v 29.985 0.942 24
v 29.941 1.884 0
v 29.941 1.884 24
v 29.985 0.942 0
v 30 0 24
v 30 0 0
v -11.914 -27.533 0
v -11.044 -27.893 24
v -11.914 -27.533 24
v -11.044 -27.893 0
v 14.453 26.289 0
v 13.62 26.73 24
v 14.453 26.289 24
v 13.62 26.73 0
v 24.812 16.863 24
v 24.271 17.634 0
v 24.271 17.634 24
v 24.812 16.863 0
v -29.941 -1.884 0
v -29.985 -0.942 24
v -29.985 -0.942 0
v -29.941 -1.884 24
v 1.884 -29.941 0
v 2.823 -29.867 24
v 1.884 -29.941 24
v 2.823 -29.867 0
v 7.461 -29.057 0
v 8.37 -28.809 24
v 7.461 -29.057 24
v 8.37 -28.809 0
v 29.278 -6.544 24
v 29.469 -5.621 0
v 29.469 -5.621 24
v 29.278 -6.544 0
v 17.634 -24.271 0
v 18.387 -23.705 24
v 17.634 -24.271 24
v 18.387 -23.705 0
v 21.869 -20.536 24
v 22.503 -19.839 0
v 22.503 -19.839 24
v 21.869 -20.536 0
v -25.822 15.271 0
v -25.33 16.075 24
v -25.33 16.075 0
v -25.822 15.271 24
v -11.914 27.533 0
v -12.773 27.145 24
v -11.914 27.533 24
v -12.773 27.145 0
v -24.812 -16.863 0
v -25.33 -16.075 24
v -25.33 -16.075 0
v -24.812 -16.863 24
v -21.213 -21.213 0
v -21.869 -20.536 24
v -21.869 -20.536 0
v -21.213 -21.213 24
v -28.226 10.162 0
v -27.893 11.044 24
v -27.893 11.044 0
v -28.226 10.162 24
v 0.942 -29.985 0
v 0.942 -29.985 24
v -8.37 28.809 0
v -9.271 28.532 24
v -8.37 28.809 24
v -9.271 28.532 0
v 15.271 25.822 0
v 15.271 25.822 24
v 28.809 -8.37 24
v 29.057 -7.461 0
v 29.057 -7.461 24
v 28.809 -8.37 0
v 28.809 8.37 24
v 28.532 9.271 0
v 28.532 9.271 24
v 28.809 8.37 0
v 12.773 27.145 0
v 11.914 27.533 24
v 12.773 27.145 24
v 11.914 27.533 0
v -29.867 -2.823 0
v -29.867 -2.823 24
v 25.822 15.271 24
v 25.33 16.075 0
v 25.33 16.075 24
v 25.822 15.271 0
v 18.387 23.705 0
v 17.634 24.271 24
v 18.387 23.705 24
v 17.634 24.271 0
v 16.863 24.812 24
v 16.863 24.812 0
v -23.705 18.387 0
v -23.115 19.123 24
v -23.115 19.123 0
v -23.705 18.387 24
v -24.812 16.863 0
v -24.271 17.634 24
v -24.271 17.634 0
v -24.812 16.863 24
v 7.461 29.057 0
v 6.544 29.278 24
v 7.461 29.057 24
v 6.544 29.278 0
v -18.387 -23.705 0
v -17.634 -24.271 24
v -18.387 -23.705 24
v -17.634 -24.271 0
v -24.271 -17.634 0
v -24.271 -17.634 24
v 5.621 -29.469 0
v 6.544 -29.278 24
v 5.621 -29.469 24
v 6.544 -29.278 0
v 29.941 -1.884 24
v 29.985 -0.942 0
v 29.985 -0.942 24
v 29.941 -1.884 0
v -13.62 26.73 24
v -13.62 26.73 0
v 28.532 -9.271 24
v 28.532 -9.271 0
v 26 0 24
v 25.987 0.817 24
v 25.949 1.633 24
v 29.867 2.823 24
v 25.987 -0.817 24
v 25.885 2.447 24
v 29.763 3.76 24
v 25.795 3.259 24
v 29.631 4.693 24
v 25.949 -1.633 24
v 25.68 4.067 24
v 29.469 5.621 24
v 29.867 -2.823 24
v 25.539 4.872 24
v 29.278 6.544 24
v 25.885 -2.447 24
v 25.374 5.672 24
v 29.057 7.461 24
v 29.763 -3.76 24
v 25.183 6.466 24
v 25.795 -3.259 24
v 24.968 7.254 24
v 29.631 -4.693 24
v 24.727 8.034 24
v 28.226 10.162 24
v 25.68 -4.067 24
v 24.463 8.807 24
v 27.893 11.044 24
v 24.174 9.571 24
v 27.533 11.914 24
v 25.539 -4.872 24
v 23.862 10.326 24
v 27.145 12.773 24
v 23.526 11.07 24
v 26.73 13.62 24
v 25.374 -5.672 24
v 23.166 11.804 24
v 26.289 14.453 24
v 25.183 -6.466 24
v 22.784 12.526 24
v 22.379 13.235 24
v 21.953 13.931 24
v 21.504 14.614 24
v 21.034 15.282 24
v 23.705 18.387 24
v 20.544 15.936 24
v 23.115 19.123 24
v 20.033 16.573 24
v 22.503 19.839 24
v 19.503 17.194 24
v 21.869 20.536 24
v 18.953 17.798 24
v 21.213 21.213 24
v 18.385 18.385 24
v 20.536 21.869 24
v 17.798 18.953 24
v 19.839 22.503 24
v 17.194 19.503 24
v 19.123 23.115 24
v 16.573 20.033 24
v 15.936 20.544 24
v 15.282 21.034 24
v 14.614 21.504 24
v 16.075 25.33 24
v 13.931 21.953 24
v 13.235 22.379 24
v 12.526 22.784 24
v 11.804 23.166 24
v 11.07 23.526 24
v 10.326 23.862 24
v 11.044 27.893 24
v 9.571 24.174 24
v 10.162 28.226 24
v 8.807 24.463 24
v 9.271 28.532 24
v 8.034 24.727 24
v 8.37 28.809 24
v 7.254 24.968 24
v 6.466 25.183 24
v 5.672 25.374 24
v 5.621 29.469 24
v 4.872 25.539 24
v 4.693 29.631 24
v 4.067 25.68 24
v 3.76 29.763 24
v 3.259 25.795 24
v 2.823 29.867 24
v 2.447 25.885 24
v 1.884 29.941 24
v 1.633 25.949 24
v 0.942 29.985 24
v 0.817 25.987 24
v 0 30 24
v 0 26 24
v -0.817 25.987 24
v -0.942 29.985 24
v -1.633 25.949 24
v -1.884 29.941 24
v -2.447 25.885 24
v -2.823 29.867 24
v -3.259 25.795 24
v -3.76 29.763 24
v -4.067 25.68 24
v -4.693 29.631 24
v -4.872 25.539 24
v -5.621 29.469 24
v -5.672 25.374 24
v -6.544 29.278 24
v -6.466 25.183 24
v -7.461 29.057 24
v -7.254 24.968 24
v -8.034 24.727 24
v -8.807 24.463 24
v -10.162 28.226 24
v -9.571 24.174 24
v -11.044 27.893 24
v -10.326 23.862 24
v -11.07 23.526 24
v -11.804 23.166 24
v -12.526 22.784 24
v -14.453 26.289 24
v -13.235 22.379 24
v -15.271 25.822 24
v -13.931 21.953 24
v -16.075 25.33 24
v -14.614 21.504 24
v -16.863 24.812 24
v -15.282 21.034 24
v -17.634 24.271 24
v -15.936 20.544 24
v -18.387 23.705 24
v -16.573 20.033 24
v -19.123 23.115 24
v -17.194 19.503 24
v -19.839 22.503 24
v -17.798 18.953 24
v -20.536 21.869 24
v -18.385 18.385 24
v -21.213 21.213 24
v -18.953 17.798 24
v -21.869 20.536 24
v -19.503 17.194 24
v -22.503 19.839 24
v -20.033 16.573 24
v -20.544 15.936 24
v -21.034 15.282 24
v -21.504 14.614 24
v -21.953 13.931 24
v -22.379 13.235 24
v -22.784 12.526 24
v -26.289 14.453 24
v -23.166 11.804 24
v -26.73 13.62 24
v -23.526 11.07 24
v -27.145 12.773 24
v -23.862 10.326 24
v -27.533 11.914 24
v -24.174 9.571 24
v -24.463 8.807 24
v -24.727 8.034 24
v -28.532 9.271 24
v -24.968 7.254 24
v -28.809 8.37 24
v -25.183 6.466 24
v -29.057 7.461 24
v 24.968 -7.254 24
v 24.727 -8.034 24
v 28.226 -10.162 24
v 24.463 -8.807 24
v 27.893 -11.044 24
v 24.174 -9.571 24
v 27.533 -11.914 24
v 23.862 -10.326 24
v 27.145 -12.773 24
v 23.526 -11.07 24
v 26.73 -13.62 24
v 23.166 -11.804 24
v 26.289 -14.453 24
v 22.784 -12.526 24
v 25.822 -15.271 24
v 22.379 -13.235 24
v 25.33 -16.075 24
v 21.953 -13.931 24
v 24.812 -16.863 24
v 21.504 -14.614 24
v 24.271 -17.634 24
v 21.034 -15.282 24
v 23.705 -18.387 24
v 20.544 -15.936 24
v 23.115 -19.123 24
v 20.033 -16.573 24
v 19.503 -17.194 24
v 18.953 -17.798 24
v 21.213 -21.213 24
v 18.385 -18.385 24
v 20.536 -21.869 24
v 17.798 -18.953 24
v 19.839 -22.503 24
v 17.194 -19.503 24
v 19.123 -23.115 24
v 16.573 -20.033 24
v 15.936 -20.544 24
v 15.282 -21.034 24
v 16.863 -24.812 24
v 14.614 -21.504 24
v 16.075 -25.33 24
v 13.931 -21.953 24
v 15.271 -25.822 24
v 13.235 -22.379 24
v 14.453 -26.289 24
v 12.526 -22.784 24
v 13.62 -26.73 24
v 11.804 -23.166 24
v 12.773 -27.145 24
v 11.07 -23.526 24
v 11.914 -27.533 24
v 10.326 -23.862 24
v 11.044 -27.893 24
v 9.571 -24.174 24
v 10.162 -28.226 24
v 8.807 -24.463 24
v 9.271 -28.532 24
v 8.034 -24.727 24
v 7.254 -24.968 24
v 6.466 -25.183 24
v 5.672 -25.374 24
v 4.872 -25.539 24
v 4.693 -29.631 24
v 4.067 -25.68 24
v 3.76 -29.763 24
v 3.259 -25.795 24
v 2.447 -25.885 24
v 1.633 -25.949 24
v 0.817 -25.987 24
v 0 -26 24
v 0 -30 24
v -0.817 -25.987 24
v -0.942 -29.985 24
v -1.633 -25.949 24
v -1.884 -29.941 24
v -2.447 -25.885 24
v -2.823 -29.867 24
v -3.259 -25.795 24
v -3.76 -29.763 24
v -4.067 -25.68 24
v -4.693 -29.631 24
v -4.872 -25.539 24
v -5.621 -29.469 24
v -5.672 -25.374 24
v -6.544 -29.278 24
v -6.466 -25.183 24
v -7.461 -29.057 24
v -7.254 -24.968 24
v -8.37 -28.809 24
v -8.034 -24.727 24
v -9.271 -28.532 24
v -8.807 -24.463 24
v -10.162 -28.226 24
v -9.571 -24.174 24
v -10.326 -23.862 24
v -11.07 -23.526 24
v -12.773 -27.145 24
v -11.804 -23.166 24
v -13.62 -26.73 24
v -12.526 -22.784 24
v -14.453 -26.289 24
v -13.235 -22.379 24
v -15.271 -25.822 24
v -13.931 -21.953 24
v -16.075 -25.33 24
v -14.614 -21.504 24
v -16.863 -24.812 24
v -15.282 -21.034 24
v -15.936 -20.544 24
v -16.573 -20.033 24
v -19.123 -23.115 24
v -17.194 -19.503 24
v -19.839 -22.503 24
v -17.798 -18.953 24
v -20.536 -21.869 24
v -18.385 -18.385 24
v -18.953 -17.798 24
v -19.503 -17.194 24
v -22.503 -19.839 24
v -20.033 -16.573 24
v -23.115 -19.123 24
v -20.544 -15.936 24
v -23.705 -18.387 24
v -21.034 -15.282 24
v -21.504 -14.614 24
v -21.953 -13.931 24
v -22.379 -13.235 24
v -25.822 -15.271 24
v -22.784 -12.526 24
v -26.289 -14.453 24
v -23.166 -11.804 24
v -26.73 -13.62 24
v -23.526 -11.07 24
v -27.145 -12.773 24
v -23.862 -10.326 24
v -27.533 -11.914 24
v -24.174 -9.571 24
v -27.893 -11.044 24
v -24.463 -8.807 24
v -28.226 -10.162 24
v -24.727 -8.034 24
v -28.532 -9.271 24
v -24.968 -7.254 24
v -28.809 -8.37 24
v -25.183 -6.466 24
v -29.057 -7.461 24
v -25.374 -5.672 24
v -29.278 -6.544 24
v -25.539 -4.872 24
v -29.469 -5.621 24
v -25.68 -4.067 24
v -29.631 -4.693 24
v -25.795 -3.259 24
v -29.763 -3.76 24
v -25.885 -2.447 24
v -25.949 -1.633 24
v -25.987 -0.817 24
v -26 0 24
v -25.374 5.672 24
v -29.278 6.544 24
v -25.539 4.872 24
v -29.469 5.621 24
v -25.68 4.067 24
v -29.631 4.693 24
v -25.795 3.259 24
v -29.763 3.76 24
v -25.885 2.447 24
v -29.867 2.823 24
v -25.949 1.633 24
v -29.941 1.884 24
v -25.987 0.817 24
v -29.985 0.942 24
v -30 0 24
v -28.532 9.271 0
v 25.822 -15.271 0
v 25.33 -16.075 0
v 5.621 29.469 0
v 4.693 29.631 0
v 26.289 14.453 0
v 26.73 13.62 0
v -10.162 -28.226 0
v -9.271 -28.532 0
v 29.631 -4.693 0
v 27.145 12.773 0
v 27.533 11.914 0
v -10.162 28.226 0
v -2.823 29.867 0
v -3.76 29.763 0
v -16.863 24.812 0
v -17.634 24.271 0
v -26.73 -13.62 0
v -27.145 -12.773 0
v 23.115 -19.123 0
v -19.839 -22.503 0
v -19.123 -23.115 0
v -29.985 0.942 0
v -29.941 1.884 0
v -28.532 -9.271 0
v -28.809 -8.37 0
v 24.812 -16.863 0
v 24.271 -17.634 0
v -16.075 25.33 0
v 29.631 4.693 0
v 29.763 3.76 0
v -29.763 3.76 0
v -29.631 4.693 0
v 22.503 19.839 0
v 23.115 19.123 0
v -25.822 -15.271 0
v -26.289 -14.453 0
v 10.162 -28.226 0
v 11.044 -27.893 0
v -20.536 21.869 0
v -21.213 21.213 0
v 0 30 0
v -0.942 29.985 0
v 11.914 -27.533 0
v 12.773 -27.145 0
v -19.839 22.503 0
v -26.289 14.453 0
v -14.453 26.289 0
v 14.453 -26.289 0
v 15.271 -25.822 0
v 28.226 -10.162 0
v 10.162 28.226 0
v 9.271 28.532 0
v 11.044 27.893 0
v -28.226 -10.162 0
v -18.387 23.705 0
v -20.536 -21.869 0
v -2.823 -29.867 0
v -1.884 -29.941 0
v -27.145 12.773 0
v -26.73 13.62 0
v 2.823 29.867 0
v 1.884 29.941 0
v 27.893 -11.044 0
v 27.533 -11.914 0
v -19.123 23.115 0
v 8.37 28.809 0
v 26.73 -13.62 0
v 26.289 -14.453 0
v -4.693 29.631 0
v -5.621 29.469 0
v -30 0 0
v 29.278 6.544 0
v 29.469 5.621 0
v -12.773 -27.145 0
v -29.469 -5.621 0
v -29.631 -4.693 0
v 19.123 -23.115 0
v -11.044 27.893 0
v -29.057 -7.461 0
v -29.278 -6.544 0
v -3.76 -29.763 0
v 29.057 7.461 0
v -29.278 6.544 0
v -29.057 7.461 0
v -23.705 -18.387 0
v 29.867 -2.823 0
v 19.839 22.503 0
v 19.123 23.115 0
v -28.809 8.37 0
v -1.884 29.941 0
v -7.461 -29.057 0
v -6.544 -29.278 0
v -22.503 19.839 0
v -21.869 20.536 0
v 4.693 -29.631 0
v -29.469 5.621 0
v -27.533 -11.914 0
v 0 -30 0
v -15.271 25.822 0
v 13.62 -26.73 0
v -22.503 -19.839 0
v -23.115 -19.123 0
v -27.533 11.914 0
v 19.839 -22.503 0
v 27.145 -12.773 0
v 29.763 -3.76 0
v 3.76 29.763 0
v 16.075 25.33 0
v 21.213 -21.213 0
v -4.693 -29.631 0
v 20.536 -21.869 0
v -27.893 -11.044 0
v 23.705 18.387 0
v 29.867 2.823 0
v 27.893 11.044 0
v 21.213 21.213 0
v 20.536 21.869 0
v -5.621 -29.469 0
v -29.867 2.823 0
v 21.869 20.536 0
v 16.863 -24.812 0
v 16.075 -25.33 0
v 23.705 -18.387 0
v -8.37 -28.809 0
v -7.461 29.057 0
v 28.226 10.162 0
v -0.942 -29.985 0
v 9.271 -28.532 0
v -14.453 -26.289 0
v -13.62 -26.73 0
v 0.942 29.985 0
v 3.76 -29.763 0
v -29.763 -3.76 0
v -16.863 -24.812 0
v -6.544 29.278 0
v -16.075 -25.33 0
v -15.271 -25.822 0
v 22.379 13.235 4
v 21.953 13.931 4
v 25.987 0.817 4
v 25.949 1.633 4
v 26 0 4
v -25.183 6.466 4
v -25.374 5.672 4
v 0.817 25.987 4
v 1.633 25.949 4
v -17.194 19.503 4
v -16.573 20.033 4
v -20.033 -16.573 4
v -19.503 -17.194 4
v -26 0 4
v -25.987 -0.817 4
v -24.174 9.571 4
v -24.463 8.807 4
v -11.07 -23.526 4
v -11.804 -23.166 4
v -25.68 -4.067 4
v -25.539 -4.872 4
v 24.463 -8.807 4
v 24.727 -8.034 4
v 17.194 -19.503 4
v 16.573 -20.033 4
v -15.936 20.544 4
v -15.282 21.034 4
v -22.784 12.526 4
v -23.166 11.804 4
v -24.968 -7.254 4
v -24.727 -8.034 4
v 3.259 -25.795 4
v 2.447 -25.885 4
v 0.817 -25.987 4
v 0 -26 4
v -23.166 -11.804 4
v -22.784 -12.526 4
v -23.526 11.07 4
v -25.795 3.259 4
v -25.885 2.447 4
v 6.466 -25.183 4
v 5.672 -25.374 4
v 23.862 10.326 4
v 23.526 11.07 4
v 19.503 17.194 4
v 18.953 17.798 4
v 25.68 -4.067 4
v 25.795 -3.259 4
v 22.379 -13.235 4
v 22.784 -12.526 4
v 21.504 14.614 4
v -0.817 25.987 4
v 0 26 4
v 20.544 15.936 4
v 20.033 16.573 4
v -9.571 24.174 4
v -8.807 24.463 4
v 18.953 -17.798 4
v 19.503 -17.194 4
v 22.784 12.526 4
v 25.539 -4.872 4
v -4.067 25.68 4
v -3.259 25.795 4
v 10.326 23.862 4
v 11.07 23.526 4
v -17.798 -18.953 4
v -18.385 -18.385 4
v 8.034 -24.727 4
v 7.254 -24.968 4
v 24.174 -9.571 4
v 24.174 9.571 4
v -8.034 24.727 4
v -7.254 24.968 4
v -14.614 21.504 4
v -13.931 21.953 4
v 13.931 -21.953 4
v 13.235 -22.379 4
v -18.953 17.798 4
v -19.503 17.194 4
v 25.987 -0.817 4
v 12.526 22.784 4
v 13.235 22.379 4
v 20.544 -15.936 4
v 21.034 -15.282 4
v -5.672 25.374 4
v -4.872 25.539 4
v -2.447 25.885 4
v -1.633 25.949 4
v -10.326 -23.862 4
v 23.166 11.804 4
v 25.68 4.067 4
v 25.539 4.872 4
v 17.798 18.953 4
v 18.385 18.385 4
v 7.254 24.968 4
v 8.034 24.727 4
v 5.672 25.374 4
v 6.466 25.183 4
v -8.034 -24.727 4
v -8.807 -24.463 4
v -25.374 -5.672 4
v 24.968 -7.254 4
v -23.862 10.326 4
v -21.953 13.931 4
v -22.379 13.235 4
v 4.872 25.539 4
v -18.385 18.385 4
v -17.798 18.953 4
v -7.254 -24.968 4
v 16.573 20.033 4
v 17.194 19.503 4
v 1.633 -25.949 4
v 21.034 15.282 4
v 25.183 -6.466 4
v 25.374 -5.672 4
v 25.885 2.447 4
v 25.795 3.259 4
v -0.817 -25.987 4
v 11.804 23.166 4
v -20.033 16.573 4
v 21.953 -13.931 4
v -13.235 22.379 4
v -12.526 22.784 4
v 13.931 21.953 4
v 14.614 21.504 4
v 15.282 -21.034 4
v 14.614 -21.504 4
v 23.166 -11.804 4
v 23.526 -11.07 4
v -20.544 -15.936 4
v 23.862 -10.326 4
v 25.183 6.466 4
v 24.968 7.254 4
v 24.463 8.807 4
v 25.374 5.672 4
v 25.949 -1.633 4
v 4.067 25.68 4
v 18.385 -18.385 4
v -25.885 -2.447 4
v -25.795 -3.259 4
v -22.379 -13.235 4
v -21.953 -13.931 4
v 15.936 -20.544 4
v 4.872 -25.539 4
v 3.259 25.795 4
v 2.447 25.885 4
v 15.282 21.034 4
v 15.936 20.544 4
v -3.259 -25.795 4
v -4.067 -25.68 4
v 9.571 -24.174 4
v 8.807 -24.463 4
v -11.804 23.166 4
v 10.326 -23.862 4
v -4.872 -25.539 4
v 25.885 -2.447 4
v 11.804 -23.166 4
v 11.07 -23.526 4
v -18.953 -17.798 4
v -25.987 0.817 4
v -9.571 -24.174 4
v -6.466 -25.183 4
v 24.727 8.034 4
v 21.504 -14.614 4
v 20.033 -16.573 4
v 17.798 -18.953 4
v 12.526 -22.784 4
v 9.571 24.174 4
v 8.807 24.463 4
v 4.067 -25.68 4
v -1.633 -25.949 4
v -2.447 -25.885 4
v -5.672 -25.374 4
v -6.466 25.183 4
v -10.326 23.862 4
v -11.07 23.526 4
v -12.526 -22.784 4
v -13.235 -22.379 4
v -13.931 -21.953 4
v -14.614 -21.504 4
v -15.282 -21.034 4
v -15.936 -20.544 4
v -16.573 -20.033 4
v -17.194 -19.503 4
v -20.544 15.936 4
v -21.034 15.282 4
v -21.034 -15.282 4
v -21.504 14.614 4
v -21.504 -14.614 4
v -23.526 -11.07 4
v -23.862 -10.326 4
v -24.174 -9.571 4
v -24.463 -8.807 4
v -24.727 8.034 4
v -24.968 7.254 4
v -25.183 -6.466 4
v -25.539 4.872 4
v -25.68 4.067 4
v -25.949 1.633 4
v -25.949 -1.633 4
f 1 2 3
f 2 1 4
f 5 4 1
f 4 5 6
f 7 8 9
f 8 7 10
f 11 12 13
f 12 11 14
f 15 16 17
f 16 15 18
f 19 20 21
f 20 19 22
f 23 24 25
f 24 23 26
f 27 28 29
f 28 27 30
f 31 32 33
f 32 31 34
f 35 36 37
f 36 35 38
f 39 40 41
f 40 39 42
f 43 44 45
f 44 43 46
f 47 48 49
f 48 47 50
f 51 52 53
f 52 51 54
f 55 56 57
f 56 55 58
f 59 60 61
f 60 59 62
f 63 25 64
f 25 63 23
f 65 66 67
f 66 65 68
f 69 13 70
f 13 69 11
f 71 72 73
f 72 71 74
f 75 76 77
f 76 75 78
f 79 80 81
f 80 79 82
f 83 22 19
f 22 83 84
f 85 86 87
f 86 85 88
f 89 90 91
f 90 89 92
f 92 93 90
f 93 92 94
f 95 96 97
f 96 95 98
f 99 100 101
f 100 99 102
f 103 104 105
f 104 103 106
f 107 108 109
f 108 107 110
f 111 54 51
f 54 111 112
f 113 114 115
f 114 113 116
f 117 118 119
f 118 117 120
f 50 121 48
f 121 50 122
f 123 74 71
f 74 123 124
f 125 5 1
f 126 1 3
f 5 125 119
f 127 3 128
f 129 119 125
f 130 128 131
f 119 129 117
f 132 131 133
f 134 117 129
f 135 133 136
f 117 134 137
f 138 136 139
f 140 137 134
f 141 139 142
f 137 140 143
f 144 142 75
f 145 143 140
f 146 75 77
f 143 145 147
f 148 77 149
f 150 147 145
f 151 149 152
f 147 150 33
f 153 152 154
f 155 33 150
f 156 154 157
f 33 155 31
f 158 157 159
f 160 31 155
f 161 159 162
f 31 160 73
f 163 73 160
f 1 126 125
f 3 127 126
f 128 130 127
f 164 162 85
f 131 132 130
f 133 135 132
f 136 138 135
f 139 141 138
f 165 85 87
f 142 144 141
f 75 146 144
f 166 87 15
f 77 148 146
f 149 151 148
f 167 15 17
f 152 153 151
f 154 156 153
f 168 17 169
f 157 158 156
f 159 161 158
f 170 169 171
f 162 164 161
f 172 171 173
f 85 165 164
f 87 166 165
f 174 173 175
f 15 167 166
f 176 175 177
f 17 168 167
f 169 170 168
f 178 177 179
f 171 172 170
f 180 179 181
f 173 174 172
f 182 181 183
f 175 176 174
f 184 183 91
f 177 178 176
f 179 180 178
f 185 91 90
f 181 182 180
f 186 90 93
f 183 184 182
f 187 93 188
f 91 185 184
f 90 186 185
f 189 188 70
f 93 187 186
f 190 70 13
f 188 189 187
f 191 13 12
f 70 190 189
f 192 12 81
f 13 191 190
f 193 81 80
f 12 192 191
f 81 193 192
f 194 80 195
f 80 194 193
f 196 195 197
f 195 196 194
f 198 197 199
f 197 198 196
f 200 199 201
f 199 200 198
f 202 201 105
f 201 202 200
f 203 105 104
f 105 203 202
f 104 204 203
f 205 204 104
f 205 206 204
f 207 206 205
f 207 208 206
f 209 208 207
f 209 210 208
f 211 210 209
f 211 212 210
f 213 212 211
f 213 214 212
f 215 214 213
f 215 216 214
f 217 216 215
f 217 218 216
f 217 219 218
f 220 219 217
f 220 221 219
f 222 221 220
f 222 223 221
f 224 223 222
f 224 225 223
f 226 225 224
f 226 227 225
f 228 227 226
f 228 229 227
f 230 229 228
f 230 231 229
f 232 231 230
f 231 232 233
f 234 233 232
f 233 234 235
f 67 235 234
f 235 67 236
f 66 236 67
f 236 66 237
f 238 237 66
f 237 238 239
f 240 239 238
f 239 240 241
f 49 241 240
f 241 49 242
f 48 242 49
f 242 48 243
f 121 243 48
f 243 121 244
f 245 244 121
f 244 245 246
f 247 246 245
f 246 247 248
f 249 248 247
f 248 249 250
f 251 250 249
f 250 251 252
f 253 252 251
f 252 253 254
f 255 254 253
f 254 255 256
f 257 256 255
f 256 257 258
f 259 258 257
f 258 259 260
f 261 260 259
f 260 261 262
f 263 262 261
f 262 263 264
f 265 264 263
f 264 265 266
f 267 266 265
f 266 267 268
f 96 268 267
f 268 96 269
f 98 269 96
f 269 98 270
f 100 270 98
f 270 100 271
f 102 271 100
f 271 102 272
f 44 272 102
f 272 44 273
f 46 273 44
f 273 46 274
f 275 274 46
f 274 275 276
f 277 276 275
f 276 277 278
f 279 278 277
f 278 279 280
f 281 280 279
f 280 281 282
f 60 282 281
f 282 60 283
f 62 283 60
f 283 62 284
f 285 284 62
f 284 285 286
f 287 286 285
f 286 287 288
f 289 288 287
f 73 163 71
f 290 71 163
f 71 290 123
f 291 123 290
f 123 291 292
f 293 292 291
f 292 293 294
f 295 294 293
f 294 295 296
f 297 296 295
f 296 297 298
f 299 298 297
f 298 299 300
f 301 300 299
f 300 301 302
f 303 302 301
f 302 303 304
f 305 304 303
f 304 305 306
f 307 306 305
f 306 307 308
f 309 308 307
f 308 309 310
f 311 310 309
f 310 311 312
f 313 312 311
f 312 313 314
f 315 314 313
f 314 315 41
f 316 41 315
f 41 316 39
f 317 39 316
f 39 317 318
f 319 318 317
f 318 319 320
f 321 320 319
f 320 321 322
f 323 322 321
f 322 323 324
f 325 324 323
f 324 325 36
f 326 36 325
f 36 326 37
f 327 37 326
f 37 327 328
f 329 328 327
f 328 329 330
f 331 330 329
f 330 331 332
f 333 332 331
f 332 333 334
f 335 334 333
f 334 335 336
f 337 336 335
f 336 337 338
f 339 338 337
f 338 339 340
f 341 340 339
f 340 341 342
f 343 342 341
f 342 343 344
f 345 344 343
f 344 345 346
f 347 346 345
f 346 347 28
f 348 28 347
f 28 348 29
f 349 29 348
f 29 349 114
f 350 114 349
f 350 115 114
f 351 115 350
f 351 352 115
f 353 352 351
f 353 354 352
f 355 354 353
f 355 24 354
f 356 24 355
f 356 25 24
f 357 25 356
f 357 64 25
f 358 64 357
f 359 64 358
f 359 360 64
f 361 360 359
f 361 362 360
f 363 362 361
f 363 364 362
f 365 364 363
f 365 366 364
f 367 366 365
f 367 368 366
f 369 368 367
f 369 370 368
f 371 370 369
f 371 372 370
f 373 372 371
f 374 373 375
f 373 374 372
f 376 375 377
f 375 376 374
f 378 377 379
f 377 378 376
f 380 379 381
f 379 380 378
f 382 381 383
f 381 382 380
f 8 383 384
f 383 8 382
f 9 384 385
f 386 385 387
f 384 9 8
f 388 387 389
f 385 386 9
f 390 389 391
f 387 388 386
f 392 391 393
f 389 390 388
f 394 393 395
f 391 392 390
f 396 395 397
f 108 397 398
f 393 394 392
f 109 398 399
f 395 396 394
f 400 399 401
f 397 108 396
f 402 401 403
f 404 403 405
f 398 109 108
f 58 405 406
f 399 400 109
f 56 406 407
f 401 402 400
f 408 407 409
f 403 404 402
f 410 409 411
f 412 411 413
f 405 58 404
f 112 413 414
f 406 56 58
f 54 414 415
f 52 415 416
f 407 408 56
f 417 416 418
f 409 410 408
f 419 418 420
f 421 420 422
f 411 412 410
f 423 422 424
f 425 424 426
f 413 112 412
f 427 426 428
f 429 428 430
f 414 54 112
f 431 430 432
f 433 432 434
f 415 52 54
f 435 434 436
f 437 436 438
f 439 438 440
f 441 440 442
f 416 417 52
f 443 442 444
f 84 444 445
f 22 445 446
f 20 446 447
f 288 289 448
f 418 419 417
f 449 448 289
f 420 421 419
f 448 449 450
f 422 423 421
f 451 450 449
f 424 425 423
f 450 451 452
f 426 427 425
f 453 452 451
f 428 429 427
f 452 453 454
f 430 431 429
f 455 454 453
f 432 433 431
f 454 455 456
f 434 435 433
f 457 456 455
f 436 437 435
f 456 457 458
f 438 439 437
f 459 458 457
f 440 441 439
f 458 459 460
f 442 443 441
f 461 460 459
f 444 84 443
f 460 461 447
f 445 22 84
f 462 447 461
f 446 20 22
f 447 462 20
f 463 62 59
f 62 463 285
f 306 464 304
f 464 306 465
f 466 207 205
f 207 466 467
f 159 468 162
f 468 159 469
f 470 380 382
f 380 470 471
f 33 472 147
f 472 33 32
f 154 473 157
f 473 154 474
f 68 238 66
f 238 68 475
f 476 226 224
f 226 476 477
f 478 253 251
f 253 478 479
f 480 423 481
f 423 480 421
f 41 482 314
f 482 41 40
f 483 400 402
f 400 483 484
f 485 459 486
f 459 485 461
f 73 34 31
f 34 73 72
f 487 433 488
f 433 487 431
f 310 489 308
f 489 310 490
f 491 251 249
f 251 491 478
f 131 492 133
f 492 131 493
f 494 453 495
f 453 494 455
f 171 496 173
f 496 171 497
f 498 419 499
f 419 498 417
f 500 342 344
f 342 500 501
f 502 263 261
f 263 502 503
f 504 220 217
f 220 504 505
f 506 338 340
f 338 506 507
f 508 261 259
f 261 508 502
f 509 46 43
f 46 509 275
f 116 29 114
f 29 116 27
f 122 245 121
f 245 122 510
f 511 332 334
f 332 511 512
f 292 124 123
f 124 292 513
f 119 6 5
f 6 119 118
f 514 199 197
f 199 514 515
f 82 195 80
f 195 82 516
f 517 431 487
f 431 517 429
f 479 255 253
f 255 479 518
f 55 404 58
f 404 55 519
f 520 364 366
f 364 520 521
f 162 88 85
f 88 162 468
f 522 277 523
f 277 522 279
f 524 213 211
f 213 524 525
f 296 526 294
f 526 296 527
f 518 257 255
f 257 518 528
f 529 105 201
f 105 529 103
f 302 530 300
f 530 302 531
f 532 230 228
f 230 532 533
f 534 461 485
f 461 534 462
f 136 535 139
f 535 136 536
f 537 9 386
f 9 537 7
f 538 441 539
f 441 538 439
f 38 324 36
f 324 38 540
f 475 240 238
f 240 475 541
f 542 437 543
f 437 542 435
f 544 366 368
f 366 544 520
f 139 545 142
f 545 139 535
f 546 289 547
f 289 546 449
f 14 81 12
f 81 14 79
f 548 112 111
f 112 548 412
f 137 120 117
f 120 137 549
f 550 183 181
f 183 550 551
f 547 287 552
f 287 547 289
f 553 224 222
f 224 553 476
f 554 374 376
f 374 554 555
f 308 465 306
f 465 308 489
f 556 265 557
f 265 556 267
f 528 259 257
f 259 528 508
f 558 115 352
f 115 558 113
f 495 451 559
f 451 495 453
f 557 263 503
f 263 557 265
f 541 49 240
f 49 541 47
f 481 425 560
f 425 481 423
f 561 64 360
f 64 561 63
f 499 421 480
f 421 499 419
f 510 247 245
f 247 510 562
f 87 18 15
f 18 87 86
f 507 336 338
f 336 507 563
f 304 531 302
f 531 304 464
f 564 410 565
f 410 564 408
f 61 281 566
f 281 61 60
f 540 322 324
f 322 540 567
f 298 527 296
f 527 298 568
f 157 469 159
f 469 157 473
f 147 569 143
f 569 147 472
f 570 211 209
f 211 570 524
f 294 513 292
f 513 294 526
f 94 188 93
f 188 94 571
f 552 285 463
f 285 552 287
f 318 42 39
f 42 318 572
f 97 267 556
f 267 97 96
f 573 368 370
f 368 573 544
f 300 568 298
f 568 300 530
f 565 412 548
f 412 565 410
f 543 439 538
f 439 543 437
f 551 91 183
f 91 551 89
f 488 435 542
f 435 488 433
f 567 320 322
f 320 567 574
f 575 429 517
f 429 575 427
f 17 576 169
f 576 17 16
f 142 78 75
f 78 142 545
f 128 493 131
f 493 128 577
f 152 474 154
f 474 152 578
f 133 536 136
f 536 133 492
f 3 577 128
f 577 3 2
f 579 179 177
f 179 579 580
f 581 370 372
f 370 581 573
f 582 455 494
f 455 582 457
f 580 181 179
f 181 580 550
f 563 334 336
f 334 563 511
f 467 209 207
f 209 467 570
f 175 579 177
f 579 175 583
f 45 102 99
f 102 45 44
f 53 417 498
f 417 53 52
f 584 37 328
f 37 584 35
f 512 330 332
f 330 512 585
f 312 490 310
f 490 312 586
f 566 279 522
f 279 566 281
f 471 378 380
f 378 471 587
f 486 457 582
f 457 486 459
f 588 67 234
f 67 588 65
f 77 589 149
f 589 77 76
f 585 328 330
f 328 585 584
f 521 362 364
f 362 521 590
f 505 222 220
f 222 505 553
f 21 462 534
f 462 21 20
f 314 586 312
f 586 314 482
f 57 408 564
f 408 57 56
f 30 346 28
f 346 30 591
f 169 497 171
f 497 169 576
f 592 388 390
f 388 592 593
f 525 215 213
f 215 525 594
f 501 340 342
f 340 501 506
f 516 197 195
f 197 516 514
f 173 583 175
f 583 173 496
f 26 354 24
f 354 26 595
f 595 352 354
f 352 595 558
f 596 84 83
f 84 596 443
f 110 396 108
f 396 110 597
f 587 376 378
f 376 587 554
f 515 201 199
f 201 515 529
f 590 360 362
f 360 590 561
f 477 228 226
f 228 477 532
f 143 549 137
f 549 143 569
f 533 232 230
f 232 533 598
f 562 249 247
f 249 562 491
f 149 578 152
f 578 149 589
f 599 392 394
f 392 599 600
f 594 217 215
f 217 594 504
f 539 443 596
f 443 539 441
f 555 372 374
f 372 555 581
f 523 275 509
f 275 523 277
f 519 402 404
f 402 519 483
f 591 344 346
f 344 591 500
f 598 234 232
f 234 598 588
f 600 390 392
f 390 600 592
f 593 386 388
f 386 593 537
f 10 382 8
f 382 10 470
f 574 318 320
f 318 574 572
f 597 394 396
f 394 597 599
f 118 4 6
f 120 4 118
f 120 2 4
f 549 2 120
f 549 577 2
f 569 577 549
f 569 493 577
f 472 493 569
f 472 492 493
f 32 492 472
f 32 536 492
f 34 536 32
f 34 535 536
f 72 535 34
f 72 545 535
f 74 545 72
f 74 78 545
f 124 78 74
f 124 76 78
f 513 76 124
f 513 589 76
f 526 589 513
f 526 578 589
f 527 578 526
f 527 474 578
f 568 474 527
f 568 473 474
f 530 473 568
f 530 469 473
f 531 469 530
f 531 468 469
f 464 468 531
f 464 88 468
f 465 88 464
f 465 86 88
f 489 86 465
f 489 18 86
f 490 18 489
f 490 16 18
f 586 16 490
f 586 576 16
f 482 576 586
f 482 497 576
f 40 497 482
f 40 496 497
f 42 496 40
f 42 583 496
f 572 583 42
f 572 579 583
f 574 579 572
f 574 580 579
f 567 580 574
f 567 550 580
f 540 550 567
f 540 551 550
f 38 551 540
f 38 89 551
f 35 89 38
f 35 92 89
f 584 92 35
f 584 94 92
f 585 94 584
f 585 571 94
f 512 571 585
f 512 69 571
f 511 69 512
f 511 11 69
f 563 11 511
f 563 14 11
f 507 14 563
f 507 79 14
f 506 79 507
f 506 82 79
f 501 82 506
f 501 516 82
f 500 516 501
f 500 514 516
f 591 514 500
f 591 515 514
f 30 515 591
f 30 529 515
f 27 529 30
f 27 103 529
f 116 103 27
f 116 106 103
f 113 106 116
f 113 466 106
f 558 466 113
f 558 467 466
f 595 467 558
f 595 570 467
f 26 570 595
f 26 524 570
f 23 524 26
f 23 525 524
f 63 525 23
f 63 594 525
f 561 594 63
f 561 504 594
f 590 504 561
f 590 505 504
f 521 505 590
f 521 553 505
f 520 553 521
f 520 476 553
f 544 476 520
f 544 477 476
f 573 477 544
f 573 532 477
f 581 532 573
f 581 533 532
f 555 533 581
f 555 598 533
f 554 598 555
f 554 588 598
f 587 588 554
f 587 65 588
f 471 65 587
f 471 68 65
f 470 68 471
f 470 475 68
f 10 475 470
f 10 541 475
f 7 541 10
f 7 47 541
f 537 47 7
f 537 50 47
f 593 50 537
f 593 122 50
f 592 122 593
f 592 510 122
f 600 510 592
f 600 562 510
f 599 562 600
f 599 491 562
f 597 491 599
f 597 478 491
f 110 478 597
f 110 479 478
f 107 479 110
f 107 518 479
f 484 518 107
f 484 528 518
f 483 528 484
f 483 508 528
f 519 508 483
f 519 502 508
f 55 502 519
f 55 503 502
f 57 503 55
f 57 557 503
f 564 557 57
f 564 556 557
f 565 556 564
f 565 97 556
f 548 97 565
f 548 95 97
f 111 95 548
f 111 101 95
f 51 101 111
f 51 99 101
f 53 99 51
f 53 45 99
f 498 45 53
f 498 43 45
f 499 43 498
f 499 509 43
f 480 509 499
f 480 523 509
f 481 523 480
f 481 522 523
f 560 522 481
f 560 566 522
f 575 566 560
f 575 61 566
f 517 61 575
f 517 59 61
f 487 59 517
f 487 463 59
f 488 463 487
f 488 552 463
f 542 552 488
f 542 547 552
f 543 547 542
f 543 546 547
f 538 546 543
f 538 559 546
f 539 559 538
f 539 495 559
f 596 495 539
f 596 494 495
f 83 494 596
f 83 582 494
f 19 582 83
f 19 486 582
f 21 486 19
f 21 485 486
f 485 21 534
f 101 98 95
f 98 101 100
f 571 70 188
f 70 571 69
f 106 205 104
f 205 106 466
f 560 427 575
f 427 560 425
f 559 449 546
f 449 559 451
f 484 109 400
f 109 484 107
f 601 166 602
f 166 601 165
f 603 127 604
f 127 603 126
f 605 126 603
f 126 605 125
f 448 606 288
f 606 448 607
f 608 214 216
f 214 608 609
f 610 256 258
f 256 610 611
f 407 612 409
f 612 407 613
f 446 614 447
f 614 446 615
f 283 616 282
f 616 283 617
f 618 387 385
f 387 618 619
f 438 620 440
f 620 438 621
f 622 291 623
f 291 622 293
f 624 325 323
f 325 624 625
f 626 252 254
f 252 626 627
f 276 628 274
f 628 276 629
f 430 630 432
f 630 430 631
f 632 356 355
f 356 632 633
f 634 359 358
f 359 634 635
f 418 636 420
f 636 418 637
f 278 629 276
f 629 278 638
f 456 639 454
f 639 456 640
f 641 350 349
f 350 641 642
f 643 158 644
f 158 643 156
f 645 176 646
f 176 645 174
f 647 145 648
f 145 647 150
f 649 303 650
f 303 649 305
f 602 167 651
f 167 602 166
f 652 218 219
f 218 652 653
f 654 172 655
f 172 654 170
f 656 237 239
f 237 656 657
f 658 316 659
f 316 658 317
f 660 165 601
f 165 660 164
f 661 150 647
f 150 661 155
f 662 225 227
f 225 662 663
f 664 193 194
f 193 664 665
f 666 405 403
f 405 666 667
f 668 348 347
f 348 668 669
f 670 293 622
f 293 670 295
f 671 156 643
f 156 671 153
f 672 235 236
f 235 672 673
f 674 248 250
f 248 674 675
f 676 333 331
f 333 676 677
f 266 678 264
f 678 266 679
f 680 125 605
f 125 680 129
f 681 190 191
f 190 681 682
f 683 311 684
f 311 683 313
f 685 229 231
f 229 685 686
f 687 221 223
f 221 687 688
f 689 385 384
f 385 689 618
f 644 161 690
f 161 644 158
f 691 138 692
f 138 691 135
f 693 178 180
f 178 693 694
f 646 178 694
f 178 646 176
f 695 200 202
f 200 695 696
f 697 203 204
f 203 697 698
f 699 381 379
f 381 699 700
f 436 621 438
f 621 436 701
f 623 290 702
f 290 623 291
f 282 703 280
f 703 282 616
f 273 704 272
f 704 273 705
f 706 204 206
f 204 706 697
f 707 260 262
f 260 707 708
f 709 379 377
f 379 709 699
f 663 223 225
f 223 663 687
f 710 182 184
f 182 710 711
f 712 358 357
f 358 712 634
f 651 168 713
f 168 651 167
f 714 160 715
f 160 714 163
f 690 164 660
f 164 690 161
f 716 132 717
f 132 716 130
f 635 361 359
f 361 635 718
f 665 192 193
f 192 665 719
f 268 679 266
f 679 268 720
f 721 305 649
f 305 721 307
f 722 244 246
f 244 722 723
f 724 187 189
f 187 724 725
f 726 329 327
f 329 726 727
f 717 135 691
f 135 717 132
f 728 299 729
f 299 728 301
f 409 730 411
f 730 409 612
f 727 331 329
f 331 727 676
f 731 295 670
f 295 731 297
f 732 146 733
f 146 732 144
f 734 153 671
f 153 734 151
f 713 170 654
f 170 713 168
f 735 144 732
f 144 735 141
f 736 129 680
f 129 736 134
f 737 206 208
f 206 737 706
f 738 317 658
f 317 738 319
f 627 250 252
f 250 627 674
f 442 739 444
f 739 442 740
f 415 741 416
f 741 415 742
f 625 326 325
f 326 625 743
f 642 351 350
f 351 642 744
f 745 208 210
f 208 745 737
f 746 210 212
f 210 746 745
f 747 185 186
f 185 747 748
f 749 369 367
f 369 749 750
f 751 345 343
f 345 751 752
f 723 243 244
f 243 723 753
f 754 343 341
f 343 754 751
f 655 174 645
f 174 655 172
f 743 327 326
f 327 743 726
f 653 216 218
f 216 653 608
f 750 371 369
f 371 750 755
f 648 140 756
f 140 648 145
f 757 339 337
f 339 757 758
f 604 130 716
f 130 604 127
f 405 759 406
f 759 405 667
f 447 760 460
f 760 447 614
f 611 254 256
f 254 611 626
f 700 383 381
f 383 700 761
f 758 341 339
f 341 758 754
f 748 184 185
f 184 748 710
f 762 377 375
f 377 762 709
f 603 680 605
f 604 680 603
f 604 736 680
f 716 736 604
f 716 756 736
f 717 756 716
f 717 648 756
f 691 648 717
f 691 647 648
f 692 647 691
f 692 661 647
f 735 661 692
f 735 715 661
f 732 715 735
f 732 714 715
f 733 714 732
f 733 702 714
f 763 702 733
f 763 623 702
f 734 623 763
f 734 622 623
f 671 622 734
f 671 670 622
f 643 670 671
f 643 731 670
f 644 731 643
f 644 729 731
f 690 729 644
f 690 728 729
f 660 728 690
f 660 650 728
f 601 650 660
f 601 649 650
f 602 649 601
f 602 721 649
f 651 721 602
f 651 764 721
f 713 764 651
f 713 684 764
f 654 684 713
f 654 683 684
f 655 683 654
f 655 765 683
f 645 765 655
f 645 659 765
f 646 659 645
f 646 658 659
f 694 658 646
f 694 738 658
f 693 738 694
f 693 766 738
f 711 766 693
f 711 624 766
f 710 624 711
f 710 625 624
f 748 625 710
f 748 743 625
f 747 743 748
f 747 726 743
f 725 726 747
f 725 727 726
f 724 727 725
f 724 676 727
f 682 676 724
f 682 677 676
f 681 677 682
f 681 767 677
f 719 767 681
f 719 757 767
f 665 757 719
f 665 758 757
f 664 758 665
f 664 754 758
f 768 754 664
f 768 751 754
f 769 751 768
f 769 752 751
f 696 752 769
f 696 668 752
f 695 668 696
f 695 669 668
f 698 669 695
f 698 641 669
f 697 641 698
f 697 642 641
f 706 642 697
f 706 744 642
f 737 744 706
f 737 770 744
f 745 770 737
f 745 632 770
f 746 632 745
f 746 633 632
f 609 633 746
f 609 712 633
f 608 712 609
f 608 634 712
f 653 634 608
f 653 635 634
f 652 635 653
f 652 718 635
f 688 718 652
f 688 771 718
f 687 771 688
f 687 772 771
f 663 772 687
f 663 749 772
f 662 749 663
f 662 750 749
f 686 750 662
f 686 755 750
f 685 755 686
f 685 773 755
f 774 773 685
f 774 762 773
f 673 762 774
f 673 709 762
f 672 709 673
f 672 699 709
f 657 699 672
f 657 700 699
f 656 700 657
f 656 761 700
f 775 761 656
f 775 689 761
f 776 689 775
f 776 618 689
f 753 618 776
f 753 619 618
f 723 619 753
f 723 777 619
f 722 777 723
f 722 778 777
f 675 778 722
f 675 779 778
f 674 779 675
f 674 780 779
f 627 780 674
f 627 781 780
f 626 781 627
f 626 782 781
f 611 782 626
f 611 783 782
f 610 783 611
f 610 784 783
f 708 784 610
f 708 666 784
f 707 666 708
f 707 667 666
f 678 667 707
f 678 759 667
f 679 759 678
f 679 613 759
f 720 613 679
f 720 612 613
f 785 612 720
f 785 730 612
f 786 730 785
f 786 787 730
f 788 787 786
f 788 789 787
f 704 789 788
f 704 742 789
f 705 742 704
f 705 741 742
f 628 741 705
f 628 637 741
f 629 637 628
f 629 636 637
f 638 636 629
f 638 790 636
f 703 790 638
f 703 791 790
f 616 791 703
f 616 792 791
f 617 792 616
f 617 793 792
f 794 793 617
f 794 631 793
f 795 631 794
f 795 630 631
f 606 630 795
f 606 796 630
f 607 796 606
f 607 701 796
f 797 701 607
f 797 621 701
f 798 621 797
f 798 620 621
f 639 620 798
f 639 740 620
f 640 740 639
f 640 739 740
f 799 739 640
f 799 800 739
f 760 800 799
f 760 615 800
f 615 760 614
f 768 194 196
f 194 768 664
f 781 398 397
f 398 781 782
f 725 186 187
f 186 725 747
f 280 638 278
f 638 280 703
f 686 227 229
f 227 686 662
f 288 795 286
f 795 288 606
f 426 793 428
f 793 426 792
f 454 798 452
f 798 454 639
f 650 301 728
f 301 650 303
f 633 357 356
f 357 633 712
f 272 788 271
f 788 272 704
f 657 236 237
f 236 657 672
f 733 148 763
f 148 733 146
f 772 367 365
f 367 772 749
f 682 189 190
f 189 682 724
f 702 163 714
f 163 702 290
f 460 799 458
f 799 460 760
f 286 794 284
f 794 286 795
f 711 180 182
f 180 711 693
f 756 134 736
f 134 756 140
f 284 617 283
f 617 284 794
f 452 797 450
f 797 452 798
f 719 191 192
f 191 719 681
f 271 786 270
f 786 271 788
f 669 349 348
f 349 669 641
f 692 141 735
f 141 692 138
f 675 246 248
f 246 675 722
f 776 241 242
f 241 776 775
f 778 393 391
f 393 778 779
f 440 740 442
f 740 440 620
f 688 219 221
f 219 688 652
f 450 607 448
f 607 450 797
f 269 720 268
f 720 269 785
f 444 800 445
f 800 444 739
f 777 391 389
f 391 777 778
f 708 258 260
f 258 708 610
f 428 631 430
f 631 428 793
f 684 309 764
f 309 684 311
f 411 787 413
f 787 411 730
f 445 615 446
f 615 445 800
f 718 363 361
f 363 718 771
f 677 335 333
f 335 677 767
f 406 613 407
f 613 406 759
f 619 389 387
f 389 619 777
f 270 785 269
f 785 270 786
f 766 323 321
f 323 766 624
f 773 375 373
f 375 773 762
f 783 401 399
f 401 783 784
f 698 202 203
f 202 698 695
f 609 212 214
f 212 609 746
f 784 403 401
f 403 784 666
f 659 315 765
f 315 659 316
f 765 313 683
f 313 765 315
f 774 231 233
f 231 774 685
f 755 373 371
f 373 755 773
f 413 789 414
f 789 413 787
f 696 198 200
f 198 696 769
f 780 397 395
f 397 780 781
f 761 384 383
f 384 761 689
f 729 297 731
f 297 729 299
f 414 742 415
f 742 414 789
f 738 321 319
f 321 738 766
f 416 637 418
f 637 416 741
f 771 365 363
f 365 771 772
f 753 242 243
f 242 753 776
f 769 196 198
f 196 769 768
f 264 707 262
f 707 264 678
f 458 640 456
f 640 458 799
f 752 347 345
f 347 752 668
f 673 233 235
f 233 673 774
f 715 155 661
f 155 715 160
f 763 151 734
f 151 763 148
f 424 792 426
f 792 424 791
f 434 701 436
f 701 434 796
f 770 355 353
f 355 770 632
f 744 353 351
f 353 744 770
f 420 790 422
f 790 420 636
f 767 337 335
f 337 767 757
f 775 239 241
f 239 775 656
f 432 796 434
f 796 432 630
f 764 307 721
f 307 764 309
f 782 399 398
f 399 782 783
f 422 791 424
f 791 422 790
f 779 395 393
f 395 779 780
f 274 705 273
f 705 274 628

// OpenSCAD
// OpenSCAD code to create a cover for a cylinder

// Parameters
inner_diameter = 52; // Inner diameter in mm
height = 24;         // Height in mm
wall_thickness = 4;  // Wall thickness in mm
$fn = 200;

// Create the outer cylinder
outer_diameter = inner_diameter + 2 * wall_thickness;


difference() {
    cylinder(h = height, d = outer_diameter, center = false);
    
    // Subtract the inner cylinder to create the hollow section
    translate([0, 0, wall_thickness]) { // To keep one end closed
        cylinder(h = height, d = inner_diameter, center = false);
    }
}
